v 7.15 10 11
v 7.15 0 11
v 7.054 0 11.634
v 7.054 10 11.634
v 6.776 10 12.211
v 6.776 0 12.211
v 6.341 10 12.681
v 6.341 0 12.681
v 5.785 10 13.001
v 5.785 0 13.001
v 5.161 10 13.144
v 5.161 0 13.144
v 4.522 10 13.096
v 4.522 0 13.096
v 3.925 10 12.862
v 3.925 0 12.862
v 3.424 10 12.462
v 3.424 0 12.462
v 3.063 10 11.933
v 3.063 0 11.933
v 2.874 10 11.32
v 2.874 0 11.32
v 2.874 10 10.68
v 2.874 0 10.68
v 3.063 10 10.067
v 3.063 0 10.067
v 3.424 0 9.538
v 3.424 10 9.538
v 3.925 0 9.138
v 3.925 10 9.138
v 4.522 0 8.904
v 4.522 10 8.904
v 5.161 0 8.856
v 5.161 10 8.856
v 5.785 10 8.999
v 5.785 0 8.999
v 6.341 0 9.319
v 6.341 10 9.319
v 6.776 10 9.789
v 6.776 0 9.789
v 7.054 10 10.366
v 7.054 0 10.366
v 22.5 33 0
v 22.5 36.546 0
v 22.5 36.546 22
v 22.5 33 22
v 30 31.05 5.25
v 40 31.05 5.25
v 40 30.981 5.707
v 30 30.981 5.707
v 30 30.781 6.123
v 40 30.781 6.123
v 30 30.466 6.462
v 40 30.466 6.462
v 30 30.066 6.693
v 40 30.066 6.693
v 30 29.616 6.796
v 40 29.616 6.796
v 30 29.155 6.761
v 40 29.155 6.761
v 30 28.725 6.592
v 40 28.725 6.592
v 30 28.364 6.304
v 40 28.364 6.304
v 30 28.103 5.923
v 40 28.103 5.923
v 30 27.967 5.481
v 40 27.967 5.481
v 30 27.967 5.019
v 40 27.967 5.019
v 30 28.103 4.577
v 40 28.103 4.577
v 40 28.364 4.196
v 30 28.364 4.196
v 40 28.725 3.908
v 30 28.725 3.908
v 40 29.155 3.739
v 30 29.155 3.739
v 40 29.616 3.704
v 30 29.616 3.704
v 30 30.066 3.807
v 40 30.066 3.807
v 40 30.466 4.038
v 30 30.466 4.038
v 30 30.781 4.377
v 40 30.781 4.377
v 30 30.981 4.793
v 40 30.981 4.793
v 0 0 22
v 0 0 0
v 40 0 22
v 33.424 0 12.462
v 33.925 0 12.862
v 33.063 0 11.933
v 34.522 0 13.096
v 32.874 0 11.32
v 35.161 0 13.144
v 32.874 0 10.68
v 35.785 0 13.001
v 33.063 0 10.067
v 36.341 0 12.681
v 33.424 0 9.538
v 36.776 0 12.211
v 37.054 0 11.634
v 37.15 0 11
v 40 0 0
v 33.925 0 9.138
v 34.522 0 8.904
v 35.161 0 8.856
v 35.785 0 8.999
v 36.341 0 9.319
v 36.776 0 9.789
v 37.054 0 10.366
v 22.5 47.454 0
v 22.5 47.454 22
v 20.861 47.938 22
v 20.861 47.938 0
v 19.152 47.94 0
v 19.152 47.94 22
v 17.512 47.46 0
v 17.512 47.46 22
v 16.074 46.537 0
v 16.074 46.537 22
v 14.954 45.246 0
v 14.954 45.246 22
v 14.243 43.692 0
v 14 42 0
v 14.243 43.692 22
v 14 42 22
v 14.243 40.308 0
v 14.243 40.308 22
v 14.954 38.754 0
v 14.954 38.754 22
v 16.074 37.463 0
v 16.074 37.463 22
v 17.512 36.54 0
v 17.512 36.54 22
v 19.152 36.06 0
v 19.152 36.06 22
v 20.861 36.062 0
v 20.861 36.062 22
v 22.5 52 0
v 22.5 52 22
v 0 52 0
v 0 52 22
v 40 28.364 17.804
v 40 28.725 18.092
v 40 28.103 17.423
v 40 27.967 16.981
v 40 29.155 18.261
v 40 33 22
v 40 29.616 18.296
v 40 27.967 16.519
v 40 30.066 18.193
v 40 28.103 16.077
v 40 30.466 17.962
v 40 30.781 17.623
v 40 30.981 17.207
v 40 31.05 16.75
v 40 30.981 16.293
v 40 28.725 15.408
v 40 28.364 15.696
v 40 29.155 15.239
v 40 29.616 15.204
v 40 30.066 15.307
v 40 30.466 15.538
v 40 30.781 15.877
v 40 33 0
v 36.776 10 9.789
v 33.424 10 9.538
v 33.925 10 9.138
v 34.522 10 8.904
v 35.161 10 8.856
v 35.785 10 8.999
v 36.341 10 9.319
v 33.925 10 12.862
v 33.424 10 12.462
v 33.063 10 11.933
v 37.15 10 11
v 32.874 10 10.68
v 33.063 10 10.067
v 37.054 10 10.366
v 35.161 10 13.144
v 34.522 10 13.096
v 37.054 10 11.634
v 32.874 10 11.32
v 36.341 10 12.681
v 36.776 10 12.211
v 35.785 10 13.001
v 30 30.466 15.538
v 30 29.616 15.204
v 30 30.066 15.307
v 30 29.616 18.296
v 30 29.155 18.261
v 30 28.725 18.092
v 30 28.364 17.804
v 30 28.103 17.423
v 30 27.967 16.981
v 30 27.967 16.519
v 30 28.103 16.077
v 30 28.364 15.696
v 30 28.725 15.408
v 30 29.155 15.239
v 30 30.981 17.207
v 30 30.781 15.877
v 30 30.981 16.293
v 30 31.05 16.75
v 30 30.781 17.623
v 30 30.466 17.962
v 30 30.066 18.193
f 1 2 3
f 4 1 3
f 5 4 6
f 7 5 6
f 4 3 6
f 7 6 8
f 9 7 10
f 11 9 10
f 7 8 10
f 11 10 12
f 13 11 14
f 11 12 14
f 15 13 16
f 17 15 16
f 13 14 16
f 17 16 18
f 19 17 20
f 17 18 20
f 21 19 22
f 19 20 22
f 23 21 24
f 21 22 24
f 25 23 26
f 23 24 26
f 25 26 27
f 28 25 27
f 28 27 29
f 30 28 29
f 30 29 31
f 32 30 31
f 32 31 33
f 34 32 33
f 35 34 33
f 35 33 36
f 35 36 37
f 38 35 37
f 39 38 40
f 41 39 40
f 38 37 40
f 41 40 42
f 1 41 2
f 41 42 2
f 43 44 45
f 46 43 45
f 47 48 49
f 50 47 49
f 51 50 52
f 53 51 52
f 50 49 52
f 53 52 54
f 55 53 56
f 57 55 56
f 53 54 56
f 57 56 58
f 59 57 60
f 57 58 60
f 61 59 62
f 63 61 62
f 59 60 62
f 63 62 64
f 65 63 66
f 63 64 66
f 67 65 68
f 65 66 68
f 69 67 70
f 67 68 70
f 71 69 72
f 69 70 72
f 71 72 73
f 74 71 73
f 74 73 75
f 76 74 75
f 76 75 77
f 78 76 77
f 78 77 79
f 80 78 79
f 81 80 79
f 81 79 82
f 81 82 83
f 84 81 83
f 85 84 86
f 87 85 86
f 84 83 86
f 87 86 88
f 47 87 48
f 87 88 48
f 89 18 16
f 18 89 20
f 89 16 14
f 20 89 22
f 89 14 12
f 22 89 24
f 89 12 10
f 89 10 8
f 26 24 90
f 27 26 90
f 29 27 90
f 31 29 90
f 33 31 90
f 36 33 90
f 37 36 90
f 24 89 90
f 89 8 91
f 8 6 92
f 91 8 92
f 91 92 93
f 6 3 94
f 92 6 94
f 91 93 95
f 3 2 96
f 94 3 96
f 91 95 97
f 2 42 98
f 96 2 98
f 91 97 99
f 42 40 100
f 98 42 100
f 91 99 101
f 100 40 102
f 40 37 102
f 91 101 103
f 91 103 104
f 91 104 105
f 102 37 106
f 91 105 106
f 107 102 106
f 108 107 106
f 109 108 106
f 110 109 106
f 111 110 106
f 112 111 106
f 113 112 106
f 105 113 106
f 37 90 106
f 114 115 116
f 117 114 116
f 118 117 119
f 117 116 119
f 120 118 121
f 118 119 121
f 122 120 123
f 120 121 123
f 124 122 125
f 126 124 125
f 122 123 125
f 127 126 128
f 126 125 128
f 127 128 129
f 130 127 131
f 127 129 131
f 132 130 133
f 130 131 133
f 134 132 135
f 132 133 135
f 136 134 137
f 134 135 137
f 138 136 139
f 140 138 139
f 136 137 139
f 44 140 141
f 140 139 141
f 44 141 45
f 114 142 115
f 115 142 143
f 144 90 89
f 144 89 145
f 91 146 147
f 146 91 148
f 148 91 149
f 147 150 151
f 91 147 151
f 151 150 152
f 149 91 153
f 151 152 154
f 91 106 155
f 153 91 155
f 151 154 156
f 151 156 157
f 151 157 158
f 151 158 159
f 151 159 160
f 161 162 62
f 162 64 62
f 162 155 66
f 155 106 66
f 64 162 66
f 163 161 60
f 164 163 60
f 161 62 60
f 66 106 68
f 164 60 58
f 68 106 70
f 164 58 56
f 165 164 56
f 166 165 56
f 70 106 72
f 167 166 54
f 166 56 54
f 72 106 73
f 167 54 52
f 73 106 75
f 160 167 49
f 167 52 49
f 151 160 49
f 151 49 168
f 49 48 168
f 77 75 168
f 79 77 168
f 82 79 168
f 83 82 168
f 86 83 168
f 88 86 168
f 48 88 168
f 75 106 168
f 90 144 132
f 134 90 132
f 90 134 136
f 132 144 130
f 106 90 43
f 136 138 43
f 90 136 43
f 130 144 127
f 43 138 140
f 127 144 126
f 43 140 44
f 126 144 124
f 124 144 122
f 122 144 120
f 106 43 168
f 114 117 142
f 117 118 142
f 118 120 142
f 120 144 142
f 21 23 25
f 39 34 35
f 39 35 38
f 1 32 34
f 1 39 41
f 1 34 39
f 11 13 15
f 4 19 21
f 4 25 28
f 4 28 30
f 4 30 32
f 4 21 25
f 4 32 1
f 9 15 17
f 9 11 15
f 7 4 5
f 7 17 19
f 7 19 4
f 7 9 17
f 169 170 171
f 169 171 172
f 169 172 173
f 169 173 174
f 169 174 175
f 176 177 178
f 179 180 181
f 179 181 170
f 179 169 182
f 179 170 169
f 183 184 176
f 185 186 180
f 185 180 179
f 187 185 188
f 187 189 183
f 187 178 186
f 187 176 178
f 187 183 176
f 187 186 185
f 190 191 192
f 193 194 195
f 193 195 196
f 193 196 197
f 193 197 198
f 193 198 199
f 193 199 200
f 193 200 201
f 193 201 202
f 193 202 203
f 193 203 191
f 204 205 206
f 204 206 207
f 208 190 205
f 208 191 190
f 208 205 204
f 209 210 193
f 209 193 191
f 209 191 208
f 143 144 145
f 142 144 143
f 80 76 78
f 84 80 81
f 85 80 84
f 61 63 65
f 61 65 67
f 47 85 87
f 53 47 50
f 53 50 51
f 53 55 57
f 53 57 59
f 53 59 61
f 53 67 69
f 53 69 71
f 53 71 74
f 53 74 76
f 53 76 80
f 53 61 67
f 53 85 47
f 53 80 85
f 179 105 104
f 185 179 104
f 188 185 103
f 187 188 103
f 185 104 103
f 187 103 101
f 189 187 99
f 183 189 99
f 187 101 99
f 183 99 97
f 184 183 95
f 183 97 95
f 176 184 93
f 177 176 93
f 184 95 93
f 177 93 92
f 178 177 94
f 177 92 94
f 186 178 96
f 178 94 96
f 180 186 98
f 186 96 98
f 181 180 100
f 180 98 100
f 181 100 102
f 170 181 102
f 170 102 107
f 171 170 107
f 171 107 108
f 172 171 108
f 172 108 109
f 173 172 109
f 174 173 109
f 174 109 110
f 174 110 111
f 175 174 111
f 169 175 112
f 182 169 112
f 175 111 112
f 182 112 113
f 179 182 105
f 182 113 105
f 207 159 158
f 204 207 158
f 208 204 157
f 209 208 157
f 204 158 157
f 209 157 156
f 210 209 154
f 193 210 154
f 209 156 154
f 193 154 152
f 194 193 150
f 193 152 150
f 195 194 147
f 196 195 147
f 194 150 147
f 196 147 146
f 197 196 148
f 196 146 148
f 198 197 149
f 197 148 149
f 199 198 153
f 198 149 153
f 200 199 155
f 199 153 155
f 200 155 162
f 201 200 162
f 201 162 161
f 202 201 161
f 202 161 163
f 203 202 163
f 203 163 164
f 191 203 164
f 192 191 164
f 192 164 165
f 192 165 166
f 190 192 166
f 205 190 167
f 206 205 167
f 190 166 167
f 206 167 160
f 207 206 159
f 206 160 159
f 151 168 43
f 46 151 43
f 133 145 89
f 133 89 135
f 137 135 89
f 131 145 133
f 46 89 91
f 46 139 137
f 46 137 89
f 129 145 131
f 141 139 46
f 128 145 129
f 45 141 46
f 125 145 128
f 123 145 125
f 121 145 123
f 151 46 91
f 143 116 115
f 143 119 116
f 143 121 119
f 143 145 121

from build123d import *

# Parameters (mm, degrees)
F0_W      = 40
F0_H      = 52
F1_DEPTH  = 22
F3_R      = 6
F4_DEPTH  = 25
F5_R      = 2.15
F6_DEPTH  = 10
F7_W      = 17.5
F7_H      = 22
F8_DEPTH  = 19
F9_R      = 1.55
F10_DEPTH = 10


with BuildPart() as f1:
    # F0 (on Top) → F1 (new body)
    with BuildSketch(Plane.XY):
        with Locations((20, 26)):
            Rectangle(F0_W, F0_H)
    extrude(amount=F1_DEPTH)

    # F3 (on face) → F4 (cut)
    with BuildSketch(Plane.XY.offset(22)):
        with Locations((20, 42)):
            Circle(F3_R)
    extrude(amount=-F4_DEPTH, mode=Mode.SUBTRACT)

    # F5 (on face) → F6 (cut)
    with BuildSketch(Plane.XZ):
        with Locations((5, 11)):
            Circle(F5_R)
        with Locations((35, 11)):
            Circle(F5_R)
    extrude(amount=-F6_DEPTH, mode=Mode.SUBTRACT)

    # F7 (on face) → F8 (cut)
    with BuildSketch(Plane(origin=(0, 52, 0), x_dir=(-1, 0, 0), z_dir=(0, 1, 0))):
        with Locations((-31.25, 11)):
            Rectangle(F7_W, F7_H)
    extrude(amount=-F8_DEPTH, mode=Mode.SUBTRACT)

    # F9 (on face) → F10 (cut)
    with BuildSketch(Plane.YZ.offset(40)):
        with Locations((29.5, 16.75)):
            Circle(F9_R)
        with Locations((29.5, 5.25)):
            Circle(F9_R)
    extrude(amount=-F10_DEPTH, mode=Mode.SUBTRACT)


solid = f1.part
